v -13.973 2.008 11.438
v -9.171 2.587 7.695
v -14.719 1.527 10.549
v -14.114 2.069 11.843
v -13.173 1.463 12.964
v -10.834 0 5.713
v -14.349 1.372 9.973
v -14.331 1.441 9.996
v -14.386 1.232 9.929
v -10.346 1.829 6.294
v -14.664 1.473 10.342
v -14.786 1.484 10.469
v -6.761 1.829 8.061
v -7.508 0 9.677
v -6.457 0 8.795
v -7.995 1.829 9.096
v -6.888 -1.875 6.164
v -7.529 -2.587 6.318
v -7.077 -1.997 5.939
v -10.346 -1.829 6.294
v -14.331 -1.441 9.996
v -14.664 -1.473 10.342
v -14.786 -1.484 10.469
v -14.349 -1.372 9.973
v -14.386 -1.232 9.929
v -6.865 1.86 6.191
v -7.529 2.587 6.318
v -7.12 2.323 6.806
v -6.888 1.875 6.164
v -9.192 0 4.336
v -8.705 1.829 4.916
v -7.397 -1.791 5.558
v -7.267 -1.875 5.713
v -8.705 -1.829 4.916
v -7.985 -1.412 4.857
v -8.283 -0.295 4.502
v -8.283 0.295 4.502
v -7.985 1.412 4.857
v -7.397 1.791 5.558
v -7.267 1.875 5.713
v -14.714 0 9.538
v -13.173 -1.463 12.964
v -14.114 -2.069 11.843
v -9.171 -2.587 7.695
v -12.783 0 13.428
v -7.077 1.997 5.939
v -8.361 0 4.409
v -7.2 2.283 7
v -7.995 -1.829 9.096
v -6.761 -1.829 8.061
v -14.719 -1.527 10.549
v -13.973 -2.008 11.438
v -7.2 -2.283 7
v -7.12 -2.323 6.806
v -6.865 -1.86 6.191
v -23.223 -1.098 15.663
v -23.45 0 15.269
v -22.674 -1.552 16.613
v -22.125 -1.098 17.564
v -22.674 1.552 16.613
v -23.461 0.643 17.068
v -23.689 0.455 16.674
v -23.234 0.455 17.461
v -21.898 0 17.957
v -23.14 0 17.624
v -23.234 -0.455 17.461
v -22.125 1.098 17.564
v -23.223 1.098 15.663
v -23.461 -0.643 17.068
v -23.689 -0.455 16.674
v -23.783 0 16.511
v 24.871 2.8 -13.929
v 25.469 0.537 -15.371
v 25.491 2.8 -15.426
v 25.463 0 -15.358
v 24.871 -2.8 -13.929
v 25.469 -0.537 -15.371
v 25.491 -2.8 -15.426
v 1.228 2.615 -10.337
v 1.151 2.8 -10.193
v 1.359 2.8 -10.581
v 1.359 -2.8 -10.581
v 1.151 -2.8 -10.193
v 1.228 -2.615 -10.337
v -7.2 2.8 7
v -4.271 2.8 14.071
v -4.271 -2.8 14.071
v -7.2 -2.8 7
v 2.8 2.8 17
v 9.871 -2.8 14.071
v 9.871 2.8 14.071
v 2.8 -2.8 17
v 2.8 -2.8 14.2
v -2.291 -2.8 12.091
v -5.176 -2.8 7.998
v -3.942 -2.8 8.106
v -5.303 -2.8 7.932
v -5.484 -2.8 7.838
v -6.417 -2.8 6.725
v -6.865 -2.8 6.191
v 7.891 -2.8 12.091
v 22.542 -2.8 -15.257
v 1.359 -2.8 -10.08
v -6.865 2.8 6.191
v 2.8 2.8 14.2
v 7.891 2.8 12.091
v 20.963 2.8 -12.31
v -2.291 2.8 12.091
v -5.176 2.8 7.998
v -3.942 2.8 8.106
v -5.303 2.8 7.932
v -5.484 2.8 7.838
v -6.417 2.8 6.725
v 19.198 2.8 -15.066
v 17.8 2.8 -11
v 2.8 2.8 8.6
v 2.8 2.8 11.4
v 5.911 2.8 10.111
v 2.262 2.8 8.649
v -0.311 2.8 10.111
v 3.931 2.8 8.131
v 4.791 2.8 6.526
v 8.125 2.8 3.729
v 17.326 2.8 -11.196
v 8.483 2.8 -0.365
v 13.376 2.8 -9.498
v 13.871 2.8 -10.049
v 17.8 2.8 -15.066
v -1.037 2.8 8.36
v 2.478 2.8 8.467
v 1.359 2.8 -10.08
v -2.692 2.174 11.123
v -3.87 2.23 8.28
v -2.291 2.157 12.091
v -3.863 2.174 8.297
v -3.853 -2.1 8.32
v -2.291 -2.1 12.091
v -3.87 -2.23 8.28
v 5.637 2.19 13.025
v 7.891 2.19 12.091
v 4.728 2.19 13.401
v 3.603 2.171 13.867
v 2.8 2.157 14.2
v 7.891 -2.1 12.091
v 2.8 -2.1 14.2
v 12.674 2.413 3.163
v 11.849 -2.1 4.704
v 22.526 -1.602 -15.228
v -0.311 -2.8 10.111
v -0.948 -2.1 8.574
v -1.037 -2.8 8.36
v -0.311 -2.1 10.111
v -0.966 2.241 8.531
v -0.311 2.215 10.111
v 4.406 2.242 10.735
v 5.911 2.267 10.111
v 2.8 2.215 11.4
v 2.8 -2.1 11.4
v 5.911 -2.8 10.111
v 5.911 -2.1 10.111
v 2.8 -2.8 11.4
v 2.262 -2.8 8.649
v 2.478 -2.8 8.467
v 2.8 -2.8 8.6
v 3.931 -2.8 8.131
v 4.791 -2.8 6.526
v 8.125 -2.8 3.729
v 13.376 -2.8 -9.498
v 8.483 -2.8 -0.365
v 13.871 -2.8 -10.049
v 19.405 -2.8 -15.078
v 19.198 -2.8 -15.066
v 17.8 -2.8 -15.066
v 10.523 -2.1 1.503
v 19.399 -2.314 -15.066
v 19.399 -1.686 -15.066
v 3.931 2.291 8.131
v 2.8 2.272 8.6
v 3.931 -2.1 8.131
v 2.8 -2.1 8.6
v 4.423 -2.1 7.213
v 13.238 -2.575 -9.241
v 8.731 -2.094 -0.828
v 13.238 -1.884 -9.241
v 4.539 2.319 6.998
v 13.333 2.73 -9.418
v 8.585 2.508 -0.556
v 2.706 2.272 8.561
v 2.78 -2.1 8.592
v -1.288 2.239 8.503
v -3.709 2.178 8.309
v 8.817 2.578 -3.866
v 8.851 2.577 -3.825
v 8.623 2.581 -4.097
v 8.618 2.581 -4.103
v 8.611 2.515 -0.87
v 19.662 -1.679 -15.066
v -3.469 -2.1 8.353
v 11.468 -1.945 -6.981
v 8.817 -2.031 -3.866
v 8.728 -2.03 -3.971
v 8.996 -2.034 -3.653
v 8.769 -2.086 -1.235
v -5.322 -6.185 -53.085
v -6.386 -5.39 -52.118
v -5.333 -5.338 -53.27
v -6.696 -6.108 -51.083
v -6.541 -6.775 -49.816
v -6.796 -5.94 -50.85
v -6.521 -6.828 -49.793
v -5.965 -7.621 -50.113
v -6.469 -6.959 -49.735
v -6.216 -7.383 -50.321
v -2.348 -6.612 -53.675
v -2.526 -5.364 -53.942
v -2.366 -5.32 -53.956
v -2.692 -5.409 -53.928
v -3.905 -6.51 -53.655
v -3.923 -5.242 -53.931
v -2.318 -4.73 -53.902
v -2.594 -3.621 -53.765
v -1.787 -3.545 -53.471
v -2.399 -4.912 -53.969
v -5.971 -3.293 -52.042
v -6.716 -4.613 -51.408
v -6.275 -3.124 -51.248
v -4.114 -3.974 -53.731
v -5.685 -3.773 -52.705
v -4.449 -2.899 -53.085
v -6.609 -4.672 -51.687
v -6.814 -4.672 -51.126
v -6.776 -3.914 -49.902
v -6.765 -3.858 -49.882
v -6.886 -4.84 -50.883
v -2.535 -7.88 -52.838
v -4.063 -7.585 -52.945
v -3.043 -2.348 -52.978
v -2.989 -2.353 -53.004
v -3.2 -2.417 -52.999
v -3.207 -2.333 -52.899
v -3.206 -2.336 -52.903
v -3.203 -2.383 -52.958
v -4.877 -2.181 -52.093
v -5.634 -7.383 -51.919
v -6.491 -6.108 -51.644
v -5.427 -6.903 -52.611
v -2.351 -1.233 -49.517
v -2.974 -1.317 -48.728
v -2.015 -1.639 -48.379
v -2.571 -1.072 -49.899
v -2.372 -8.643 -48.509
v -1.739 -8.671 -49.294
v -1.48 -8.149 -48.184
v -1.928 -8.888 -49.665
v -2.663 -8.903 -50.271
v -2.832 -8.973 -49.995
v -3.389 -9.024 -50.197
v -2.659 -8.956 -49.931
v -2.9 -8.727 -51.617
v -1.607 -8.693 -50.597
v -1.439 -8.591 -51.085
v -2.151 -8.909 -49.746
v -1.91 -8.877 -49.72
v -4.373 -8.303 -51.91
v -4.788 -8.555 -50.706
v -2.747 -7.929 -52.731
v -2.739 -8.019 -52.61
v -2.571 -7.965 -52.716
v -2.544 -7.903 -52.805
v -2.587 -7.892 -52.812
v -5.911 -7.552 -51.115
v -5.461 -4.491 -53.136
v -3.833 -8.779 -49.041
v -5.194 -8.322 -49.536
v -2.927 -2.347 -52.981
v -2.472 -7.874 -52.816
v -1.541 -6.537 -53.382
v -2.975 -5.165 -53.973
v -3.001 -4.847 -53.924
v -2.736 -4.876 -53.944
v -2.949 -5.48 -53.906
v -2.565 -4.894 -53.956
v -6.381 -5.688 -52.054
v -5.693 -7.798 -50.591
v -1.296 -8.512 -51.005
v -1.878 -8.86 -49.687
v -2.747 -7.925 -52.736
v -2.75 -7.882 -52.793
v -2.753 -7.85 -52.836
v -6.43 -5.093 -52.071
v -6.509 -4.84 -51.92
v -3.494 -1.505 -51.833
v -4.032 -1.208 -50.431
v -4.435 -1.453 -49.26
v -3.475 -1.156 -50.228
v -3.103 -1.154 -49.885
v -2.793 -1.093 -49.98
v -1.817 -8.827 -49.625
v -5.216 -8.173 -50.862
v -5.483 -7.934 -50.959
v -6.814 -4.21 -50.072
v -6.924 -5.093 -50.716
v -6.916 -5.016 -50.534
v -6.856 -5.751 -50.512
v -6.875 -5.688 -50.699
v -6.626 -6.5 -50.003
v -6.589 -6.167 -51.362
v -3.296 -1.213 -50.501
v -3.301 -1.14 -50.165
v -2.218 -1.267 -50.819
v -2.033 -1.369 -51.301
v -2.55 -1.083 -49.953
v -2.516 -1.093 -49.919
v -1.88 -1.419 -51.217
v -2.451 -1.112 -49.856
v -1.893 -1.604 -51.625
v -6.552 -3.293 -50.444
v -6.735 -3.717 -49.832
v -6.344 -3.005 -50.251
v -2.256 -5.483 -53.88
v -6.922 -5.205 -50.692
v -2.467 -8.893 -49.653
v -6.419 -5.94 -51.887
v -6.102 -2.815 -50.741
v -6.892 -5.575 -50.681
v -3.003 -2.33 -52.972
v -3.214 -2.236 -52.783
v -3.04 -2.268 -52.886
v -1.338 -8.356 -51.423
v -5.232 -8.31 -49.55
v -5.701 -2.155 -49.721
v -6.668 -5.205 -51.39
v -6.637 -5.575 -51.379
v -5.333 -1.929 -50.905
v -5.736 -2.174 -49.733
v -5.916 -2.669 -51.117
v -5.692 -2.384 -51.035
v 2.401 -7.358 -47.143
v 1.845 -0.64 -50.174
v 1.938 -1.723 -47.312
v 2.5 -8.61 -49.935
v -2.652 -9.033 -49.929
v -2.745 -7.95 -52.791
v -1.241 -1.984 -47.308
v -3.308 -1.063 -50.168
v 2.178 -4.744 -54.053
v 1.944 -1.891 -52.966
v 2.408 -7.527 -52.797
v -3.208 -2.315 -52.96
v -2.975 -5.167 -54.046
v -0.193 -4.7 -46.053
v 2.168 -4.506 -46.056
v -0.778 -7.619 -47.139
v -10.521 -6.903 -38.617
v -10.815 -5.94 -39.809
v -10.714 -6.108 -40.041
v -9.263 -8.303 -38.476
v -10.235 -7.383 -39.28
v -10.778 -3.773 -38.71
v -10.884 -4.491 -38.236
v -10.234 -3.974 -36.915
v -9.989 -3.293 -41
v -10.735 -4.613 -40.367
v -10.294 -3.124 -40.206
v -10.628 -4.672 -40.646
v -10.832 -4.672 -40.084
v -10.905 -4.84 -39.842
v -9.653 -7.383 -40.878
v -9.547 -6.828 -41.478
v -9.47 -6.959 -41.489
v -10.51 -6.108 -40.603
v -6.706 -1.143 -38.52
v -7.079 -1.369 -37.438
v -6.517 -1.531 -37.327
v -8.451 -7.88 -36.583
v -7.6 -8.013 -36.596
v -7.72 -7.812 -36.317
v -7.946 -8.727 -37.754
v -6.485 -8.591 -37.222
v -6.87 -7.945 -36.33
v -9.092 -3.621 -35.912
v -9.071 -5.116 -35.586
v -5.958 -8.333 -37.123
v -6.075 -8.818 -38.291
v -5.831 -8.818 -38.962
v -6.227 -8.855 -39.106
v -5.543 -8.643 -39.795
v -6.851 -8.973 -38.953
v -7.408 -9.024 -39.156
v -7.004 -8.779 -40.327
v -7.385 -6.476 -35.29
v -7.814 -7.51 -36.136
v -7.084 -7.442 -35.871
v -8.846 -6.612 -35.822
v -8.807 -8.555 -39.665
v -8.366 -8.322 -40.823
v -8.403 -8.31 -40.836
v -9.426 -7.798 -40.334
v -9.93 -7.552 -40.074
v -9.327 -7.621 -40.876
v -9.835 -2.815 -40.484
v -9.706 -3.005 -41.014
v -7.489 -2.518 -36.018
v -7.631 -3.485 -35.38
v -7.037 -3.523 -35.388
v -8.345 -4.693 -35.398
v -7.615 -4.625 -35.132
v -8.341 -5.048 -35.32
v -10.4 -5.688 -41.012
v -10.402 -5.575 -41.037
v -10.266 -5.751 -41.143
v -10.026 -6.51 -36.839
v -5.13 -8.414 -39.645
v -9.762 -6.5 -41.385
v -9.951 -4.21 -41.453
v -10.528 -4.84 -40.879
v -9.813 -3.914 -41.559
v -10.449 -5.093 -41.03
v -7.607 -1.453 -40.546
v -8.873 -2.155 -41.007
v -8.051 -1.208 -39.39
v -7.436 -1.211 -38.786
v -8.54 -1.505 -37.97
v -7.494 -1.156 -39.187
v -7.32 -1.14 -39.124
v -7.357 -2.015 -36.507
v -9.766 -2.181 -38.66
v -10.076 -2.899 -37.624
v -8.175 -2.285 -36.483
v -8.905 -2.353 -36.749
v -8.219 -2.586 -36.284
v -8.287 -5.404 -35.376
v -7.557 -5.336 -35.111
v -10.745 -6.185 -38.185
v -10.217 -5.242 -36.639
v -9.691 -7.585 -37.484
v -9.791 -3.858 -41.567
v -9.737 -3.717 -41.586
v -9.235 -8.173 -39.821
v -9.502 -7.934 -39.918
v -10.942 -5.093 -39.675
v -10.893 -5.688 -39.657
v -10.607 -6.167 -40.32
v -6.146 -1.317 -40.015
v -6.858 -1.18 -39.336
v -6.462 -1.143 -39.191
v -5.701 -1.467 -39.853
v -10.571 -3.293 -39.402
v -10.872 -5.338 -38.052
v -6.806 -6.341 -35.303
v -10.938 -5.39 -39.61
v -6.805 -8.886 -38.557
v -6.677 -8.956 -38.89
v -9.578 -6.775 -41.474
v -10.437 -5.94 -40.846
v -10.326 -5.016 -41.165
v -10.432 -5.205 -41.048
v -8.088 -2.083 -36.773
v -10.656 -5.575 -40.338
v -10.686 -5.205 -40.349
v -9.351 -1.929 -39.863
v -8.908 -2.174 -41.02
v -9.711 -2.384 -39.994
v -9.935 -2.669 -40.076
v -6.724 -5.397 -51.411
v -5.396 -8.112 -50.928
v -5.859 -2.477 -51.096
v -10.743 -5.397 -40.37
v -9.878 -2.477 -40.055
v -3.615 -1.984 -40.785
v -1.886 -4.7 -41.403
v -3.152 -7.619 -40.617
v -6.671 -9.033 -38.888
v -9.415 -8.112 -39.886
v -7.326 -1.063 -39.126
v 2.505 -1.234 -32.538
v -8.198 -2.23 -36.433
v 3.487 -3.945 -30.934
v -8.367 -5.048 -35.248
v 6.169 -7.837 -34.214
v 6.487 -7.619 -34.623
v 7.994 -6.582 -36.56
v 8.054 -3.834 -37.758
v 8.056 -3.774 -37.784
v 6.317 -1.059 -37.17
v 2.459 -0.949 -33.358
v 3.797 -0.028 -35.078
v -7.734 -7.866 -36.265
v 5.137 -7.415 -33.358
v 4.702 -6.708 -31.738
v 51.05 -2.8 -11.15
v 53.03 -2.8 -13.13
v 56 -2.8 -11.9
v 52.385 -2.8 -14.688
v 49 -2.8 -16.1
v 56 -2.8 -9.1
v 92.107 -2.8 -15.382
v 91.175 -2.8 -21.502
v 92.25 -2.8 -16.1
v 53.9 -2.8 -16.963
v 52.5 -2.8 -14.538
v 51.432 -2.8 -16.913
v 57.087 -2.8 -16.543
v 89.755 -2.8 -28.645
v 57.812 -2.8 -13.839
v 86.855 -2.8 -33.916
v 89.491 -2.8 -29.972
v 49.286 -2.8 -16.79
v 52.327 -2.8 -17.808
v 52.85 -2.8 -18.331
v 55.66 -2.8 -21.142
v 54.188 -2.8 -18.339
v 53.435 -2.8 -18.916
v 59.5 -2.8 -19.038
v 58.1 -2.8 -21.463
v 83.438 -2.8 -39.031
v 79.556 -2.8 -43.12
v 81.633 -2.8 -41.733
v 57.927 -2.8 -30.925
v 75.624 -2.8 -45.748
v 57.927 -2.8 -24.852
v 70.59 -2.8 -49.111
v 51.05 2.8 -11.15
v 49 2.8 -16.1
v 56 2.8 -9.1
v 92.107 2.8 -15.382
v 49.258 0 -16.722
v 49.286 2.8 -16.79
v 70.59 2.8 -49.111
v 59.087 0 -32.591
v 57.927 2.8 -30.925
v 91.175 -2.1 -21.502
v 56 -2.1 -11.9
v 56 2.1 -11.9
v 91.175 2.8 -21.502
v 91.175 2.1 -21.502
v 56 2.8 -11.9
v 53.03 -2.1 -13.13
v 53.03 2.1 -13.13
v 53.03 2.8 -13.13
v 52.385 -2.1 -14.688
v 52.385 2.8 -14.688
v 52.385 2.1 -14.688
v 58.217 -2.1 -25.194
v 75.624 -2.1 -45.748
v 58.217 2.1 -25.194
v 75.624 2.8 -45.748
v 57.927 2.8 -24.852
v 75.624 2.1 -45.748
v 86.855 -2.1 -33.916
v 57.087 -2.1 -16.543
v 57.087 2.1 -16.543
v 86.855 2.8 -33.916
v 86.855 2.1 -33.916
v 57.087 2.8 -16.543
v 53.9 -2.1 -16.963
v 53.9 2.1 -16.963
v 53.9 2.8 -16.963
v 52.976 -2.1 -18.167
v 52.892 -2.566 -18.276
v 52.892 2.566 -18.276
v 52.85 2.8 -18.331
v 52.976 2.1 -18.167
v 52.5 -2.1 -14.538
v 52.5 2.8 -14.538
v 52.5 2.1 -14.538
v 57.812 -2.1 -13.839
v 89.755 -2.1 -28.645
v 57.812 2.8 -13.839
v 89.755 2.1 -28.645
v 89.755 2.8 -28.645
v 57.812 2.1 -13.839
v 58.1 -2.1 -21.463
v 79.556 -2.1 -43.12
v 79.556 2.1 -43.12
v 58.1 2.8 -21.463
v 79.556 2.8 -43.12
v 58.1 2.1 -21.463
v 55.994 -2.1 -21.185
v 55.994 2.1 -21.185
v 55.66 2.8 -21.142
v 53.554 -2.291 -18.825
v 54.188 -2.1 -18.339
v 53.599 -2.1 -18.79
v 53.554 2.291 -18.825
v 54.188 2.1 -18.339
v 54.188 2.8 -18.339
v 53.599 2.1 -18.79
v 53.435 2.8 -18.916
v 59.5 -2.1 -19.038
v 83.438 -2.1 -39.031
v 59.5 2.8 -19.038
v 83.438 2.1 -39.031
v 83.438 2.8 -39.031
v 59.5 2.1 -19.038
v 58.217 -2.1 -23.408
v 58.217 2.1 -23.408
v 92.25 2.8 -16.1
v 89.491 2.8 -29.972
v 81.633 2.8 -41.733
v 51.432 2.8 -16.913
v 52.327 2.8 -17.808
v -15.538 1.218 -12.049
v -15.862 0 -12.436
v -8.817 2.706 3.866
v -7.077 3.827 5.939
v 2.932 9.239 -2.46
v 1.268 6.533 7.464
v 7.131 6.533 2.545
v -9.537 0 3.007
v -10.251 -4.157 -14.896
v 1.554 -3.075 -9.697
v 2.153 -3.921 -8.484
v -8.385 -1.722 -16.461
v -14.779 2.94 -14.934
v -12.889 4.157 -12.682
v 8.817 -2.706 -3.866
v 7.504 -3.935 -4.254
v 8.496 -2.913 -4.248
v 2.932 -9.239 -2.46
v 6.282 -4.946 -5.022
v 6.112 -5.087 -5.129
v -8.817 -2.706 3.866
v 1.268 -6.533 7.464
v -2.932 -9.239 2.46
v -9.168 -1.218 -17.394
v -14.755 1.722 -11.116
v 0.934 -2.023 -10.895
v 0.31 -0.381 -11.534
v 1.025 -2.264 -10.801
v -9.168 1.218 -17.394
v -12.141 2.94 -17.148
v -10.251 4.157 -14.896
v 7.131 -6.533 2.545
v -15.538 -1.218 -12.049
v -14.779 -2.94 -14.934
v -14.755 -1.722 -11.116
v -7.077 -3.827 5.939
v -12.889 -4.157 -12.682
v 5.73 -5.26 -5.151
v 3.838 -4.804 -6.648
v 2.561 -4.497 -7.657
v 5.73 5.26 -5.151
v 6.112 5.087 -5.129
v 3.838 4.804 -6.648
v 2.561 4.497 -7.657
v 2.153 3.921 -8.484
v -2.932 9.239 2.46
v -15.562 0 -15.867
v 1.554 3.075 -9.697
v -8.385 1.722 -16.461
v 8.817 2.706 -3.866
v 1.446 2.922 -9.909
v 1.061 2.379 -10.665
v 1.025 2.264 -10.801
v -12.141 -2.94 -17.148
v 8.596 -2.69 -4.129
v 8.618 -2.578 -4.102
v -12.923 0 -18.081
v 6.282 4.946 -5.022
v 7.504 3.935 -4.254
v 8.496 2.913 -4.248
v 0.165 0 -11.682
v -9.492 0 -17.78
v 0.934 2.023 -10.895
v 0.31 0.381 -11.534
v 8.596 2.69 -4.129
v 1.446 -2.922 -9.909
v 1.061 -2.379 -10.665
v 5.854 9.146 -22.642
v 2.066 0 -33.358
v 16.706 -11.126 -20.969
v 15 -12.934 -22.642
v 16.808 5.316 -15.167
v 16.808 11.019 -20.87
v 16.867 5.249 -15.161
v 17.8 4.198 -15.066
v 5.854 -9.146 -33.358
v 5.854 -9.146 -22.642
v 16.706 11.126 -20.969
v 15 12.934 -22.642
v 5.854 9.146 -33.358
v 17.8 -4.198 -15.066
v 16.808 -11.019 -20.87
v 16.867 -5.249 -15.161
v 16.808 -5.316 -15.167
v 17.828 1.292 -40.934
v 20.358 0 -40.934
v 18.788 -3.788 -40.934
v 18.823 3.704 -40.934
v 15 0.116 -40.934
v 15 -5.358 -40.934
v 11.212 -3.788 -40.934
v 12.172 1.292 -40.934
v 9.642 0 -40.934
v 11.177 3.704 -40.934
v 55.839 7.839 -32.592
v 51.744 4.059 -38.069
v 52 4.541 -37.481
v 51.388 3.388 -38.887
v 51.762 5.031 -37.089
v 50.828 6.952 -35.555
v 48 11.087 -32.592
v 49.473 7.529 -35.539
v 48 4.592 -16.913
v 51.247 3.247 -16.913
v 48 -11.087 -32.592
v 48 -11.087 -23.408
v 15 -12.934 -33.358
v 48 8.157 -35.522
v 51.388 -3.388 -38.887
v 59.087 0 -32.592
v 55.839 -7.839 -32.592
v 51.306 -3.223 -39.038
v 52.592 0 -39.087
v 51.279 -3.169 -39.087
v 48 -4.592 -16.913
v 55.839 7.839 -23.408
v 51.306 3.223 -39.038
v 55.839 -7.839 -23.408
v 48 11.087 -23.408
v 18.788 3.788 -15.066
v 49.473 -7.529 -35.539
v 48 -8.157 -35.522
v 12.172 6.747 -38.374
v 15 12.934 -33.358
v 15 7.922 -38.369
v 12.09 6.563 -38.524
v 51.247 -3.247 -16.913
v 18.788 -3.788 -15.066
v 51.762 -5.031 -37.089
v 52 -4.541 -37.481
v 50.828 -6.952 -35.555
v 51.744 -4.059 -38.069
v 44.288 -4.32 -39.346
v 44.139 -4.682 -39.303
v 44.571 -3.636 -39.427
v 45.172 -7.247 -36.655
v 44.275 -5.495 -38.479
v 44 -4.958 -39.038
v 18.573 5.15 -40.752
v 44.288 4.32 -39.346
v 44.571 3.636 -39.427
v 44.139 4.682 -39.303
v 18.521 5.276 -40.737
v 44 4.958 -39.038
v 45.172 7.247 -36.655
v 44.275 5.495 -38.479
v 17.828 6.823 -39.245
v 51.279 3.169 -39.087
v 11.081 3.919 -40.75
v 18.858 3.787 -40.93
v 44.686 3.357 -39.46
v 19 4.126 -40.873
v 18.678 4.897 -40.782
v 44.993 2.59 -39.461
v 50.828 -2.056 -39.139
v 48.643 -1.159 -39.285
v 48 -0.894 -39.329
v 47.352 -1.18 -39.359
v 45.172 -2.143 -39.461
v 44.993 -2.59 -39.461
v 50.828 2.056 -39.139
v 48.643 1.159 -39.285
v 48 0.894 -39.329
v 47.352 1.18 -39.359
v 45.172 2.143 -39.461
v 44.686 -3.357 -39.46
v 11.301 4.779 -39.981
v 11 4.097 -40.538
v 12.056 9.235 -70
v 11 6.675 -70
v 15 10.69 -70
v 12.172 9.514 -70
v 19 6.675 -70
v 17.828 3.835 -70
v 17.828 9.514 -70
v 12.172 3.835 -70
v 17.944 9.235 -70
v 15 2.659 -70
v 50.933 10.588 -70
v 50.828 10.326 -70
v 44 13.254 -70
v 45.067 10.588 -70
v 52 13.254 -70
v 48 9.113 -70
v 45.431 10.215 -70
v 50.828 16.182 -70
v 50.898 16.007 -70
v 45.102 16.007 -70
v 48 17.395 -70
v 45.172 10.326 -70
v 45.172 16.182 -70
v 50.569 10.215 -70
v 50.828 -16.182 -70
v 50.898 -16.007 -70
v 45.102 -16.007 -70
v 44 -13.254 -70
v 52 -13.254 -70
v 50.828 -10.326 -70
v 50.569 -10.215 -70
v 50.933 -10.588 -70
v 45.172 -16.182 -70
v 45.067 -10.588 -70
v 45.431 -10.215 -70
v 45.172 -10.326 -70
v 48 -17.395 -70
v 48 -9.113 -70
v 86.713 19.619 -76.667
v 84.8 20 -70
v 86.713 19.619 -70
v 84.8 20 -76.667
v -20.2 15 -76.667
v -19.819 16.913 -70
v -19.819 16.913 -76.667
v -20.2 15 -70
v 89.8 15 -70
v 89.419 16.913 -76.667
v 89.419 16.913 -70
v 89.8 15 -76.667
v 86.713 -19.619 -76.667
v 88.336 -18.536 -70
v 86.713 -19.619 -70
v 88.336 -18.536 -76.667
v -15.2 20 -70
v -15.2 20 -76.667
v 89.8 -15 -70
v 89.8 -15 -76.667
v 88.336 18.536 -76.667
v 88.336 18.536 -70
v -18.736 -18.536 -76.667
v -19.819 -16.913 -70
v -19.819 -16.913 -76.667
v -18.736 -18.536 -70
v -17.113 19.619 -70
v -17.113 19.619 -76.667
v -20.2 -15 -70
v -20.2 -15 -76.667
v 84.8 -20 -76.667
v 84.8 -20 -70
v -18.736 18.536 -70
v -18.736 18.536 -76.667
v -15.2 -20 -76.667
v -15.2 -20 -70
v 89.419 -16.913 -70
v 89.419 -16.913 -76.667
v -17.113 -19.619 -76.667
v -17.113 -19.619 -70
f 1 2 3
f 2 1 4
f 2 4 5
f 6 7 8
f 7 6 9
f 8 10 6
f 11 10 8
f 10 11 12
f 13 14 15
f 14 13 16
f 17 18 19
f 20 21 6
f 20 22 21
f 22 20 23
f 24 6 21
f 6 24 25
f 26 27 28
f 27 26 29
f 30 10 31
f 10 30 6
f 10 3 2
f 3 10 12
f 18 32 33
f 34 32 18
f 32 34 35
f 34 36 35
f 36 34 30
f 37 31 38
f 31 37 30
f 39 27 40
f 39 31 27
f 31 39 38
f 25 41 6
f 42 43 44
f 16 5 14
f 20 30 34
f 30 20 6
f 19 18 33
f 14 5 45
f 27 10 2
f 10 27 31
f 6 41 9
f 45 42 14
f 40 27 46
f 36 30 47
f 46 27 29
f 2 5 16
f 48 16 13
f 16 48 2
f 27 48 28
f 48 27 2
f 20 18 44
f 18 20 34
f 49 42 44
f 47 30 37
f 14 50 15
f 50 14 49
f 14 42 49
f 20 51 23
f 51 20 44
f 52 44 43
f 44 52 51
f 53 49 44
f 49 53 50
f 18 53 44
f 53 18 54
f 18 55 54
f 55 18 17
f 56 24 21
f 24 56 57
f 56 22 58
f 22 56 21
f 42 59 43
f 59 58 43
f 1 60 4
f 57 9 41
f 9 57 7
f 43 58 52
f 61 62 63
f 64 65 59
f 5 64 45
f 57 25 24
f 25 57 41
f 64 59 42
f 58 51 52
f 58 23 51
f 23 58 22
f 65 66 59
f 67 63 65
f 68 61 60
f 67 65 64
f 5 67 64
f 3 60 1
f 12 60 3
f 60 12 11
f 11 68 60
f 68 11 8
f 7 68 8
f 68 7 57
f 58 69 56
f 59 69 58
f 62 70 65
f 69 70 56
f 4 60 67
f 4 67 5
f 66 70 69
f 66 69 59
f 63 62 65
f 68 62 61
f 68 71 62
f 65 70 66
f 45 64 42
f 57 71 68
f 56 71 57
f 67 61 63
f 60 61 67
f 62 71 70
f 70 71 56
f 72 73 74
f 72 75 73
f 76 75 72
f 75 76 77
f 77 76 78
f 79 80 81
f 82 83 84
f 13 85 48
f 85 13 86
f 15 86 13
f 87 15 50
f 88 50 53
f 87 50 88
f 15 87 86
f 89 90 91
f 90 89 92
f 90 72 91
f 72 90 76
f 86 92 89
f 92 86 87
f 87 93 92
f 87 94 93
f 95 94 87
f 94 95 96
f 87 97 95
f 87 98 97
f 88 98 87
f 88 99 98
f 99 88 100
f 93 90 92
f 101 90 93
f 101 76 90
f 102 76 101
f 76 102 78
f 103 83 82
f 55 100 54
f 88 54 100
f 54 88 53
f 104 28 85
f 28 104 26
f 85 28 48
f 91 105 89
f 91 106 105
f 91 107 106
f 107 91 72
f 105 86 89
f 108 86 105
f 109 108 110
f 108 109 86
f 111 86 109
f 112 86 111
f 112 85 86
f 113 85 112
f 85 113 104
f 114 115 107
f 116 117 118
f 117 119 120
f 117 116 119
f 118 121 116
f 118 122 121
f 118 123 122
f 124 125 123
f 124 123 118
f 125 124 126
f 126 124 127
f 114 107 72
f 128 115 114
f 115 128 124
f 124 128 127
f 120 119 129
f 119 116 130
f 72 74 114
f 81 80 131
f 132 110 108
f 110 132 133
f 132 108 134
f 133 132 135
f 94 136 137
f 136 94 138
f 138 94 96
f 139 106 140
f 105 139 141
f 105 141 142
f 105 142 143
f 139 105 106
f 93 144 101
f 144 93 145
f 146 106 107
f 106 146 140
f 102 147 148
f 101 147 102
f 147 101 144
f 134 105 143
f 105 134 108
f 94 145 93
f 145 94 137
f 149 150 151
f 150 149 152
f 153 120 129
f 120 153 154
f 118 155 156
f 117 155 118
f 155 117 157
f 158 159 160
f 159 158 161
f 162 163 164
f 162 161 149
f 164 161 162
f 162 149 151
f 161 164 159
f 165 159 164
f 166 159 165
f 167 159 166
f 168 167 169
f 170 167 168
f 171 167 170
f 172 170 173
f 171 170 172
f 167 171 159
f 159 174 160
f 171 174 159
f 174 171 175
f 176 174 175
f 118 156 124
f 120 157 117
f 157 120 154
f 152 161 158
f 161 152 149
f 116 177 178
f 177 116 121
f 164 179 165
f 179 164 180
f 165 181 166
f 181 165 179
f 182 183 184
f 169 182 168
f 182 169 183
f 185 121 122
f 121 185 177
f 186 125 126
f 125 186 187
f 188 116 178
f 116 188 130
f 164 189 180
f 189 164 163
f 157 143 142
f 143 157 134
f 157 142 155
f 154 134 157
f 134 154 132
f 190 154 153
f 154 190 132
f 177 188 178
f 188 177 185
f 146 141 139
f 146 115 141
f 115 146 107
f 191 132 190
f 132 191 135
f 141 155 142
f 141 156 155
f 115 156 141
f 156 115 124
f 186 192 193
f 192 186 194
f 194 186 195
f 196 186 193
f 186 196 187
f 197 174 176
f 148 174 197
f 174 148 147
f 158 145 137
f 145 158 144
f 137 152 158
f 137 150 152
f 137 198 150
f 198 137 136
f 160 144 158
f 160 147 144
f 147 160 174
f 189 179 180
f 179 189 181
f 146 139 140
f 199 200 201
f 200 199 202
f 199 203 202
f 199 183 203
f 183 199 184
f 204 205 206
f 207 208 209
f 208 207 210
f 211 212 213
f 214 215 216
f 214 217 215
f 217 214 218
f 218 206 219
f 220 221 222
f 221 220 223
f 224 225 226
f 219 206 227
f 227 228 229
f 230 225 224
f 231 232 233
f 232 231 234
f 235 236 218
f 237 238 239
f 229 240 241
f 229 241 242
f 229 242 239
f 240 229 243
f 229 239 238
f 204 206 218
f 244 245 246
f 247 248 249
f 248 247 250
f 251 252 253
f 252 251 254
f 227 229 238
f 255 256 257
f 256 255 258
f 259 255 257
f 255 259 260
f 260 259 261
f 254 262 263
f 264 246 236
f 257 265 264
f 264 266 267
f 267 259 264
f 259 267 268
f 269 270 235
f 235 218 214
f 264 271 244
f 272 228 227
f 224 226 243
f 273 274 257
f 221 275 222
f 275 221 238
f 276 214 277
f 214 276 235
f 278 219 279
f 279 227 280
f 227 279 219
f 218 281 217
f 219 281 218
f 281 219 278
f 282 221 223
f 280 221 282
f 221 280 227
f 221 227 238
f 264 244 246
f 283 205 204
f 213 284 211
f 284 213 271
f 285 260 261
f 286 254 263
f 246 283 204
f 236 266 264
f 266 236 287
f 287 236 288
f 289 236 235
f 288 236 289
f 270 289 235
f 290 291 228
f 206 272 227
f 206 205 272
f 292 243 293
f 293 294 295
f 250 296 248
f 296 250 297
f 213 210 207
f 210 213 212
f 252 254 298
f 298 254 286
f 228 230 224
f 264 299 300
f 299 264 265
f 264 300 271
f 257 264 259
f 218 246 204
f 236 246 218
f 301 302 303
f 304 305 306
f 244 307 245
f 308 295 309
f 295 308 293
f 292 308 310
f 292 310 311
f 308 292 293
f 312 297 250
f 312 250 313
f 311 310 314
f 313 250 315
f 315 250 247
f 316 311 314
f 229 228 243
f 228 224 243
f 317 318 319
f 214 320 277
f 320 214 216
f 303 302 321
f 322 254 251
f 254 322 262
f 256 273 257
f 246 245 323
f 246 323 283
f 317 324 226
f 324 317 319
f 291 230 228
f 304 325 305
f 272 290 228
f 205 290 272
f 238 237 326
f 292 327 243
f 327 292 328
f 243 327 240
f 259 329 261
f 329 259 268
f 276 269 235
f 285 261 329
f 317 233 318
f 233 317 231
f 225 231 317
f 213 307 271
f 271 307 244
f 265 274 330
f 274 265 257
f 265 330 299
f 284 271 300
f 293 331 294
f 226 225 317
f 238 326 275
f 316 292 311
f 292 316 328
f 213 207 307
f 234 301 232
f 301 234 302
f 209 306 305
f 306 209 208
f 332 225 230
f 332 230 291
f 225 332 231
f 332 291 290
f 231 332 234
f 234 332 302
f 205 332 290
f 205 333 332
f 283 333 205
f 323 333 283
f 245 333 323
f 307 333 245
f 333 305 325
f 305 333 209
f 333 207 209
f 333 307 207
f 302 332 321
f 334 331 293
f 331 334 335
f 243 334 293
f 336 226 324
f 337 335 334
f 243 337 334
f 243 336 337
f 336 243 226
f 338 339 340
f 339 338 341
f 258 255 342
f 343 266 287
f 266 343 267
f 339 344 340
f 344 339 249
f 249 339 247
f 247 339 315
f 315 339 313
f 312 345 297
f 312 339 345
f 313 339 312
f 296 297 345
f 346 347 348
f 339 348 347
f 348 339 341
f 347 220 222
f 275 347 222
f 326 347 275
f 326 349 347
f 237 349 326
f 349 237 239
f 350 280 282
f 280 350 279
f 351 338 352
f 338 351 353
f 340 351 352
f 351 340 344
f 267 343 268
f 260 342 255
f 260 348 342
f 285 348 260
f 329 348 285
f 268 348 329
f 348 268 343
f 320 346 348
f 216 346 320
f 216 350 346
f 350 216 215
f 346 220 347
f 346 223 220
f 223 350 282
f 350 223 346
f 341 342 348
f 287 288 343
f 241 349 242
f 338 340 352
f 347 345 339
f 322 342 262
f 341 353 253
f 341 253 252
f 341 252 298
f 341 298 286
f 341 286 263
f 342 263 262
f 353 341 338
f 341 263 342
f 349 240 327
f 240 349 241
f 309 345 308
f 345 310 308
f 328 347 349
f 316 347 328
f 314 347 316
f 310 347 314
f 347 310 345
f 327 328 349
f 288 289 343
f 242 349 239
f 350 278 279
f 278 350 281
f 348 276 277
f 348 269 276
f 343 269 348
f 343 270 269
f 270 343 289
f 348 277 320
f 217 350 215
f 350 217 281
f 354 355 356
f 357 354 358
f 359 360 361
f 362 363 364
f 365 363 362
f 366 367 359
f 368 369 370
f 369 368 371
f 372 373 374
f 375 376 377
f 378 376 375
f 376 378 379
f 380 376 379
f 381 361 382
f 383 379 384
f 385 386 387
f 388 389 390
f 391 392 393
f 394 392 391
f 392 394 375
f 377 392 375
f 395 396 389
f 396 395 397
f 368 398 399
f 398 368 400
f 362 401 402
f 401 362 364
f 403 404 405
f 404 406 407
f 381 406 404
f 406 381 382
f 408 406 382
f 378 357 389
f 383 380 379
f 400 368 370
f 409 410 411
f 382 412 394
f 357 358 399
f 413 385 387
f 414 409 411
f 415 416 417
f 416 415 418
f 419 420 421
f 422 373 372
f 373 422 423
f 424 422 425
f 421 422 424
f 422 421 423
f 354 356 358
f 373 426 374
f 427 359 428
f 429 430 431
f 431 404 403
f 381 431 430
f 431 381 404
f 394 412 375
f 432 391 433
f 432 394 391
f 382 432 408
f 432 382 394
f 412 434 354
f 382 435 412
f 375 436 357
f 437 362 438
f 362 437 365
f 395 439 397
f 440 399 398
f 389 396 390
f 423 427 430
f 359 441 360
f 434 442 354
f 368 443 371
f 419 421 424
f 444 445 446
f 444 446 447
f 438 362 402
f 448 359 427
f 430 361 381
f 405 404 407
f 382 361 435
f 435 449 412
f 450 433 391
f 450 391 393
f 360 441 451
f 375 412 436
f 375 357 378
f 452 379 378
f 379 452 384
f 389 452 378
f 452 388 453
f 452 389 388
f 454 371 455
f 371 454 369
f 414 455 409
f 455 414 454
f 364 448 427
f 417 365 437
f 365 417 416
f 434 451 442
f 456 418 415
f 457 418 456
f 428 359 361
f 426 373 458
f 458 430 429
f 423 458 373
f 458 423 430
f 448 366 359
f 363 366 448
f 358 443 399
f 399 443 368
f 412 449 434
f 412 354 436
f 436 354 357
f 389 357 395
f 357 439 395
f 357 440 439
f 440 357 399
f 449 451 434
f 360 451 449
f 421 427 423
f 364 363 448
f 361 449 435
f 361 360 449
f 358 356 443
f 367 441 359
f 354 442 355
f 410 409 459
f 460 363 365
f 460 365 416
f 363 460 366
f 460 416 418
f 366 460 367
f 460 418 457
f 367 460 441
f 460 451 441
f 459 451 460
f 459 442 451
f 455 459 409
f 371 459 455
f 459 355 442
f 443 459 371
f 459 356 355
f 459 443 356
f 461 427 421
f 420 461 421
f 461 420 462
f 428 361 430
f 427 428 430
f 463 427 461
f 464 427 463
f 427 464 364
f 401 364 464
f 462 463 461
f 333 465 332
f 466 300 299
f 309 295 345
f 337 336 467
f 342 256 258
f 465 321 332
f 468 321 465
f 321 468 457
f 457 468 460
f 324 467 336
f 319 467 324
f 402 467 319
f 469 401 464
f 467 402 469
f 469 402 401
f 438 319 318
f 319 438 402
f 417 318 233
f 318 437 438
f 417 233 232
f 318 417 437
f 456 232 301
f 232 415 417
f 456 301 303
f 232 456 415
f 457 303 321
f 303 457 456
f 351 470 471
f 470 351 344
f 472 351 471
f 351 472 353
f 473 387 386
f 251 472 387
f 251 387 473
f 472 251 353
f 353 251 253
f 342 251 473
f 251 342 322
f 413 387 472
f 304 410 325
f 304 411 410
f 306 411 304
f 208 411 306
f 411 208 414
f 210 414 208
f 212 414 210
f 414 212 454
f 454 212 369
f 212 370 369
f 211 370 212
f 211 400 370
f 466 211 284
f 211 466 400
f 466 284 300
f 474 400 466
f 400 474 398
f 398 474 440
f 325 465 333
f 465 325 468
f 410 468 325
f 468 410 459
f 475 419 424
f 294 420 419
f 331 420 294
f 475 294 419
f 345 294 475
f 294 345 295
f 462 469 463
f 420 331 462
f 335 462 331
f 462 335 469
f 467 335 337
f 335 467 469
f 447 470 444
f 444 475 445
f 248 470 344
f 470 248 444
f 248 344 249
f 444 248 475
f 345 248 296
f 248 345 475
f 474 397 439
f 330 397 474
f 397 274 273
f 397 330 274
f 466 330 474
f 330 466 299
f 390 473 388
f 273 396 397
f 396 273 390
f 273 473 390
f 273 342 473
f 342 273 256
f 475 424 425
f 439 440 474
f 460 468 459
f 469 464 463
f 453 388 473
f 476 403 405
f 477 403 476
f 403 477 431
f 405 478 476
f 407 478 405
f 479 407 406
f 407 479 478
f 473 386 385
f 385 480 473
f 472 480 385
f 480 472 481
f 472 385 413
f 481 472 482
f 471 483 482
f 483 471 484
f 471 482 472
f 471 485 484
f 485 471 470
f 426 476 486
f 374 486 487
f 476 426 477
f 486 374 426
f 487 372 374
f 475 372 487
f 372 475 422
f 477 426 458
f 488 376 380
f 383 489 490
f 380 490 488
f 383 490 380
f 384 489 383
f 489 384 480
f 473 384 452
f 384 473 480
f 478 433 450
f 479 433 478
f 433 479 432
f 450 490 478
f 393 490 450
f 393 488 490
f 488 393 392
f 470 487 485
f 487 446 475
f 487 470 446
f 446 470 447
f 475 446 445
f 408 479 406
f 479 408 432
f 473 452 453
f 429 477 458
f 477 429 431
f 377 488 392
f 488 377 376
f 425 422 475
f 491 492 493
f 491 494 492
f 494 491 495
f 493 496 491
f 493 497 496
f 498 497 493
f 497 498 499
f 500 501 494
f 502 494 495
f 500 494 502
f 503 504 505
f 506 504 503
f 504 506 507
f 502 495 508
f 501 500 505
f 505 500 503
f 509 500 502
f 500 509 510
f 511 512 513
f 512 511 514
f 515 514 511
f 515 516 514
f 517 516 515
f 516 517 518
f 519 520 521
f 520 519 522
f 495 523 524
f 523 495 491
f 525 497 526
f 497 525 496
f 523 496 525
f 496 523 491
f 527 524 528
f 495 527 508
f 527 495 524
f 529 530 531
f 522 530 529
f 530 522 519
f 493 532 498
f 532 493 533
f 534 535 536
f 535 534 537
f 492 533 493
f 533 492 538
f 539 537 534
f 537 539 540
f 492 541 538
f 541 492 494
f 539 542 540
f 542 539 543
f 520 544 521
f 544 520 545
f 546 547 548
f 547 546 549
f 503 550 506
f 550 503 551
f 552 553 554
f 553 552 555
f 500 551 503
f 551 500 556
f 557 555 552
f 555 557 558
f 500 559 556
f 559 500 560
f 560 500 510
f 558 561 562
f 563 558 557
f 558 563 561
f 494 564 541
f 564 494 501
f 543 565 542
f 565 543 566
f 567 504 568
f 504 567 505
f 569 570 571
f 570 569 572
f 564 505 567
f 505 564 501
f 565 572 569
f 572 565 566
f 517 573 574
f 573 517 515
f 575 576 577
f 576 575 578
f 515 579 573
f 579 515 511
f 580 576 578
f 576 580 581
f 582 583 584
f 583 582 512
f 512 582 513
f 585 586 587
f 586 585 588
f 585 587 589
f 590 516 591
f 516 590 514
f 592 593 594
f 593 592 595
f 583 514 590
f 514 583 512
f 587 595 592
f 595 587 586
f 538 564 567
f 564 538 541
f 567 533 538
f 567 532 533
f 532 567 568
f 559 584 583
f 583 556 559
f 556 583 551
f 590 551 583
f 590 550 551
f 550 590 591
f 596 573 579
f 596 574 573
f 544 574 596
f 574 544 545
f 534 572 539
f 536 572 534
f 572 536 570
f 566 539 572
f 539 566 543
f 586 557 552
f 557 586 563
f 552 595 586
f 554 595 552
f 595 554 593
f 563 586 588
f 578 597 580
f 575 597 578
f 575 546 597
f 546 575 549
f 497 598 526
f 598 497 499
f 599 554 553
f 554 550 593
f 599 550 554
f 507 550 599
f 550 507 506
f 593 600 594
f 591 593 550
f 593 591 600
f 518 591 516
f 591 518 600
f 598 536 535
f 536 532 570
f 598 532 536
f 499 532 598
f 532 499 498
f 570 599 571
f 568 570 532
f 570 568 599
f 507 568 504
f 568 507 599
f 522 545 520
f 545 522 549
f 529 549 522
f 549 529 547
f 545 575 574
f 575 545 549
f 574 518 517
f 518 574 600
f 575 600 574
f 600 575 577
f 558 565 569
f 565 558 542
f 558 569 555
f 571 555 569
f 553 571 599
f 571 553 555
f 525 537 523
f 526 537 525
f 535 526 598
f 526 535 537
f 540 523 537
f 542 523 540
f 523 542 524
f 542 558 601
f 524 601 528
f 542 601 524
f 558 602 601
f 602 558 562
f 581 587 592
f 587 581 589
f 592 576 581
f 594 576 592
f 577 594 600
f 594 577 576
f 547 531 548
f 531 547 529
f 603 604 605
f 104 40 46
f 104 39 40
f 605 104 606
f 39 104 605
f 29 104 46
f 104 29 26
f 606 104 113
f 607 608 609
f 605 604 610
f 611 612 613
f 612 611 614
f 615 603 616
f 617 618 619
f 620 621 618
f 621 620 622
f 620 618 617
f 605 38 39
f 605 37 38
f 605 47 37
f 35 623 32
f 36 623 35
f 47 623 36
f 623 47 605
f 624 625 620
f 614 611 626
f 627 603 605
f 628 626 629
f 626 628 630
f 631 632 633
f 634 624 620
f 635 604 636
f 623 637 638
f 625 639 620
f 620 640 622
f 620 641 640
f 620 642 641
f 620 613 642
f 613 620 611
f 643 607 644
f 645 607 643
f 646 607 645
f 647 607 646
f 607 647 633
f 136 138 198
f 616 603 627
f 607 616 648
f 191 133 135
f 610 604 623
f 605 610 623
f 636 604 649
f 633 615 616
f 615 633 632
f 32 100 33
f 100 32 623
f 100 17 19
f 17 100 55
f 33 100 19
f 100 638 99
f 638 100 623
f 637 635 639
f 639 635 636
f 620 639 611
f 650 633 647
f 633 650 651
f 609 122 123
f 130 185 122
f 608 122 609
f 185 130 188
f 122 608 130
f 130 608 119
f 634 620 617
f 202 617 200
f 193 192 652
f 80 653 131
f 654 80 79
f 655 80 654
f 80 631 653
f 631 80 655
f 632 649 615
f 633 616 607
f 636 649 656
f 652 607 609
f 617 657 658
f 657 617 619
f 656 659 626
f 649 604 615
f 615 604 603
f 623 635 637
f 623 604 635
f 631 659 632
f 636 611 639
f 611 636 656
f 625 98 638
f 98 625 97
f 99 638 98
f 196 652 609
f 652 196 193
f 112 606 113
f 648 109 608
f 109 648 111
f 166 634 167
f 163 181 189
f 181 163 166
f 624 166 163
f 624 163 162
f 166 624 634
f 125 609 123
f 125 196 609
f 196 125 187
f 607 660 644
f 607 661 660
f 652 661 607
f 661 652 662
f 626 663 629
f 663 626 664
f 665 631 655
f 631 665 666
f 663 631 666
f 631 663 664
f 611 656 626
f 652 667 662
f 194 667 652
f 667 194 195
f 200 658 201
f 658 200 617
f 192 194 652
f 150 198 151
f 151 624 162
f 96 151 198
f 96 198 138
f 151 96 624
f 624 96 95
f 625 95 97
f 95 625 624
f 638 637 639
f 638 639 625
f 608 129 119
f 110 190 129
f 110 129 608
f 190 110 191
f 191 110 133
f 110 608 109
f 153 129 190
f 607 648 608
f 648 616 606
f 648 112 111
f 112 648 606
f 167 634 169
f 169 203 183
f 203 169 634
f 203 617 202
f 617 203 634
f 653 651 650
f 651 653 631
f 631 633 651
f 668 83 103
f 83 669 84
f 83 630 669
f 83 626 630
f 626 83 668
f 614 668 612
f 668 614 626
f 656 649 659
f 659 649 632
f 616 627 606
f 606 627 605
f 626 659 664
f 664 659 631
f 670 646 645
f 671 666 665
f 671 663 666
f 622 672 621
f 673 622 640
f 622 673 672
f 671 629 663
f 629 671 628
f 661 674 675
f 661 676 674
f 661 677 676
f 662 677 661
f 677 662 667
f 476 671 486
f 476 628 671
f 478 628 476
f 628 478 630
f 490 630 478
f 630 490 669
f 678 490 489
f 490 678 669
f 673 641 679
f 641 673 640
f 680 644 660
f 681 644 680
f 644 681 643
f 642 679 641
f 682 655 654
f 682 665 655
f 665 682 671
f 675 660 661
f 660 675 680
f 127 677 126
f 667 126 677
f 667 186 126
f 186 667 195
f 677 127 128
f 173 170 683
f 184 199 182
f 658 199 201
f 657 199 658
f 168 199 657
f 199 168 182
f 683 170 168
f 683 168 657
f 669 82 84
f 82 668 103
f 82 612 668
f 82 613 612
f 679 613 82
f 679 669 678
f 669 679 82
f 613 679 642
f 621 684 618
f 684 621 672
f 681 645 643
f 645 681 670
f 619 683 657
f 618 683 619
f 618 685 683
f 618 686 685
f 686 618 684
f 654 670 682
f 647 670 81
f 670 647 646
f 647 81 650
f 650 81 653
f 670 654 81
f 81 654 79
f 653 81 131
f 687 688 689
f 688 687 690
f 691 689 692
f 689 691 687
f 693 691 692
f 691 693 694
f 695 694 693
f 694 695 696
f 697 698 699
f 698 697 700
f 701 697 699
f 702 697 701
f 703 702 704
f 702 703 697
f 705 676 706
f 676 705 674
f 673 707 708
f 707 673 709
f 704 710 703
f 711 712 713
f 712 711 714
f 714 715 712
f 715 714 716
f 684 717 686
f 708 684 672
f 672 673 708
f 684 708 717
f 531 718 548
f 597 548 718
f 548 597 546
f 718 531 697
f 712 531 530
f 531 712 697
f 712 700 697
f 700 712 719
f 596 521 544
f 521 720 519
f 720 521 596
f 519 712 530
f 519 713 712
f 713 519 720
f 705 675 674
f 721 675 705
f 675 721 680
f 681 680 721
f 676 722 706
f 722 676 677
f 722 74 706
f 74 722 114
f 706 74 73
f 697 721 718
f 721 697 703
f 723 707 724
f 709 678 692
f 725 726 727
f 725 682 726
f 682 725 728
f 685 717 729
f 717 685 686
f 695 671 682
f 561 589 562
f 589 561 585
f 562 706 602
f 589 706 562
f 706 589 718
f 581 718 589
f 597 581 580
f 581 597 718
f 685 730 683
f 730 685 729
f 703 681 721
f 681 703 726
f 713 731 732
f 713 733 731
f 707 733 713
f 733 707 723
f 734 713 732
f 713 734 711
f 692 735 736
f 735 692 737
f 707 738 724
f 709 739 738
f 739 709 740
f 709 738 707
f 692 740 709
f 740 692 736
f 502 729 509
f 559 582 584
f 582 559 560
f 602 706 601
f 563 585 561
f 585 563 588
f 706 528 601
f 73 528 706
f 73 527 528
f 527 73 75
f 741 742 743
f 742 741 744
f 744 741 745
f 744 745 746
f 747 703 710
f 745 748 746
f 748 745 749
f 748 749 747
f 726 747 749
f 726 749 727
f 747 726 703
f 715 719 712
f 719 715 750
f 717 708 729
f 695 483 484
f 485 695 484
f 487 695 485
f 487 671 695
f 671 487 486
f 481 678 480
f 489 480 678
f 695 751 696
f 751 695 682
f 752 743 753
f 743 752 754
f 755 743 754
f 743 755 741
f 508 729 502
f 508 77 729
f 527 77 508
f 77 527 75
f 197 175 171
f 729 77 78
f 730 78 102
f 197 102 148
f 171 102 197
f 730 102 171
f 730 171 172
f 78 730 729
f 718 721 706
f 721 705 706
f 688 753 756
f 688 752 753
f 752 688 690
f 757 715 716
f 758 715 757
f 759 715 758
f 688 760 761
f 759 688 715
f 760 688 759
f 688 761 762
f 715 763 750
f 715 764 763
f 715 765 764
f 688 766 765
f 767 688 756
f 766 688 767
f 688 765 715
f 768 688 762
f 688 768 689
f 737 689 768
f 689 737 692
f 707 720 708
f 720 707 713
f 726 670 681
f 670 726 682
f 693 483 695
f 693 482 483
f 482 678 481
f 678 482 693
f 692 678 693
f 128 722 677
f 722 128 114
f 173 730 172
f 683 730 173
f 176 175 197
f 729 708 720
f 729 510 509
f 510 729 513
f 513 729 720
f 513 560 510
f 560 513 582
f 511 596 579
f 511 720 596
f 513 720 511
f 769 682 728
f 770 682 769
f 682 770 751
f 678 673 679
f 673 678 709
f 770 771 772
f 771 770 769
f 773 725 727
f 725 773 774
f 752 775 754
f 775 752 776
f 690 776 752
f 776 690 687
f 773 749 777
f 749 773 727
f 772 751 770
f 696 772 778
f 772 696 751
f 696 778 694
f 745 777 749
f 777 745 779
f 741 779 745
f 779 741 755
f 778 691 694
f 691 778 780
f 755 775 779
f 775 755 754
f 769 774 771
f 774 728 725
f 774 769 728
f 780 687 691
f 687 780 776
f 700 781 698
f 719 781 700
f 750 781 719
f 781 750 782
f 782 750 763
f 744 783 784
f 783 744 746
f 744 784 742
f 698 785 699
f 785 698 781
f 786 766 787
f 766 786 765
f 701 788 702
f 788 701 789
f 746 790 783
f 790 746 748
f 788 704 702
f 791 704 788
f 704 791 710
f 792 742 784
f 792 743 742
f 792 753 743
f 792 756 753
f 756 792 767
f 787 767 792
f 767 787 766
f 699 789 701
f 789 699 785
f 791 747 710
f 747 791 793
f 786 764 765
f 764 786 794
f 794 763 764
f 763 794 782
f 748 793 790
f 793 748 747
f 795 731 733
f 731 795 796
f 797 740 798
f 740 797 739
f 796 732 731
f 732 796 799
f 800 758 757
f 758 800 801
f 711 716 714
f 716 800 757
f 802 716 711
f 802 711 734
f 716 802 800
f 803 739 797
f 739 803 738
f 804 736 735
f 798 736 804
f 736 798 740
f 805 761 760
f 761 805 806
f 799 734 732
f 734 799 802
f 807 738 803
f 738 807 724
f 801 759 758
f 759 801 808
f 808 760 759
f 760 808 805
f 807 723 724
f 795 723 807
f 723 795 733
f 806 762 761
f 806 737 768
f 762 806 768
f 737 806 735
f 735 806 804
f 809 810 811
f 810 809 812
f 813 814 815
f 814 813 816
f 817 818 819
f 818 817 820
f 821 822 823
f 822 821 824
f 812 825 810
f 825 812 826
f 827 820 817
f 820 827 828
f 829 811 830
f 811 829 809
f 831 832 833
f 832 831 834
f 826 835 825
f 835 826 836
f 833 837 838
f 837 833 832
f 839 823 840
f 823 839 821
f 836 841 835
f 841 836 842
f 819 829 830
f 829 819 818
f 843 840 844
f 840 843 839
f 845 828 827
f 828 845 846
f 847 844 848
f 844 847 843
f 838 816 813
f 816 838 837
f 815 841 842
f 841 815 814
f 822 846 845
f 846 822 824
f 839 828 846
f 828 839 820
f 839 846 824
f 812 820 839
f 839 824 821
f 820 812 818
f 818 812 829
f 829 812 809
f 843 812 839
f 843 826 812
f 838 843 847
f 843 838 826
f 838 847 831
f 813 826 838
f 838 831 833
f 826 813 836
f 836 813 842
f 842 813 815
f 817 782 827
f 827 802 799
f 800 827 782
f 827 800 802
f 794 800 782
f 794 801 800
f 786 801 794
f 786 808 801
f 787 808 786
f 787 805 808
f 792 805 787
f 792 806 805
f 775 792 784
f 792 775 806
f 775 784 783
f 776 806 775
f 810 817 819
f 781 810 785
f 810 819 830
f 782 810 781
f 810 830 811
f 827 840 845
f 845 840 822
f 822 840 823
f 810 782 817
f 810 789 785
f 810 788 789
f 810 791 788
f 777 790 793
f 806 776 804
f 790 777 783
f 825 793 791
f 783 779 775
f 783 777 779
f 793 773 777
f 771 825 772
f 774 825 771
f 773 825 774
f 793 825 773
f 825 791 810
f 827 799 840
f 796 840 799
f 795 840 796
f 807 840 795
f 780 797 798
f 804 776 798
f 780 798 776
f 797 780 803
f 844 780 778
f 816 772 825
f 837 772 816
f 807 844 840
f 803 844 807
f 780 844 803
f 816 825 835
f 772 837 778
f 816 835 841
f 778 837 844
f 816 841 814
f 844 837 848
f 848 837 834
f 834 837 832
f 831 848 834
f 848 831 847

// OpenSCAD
// Cadcorn, a parametric model of a 3D-printable unicorn
// ©2015 Paul Houghton, paul.houghton@futurice.com, CC-attribution-sharealike license, http://creativecommons.org/licenses/by-sa/4.0/
low_poly = 8;
high_poly = 64;
low_poly_joint = 16;
high_poly_joint = 64;

$fn=low_poly;
joint_poly = low_poly_joint;
scale = 1;

head_big_radius = 10*scale;
head_small_radius = 4.5*scale;
head_length = 18*scale;
head_angle = 50;

horn_length = 20*scale;
horn_radius = 2.8*scale;

mane_thickness = 2*horn_radius;
mane_radius = head_big_radius;
mane_height = head_big_radius * 0.7;
mane_x = head_big_radius * 0.28;
mane_length_x = 10*scale;
mane_length_z = 20*scale;

hair_thickness = mane_thickness / 8;
hair_spacing = mane_thickness / 2;

neck_radius = 3*scale;
neck_ratio = .2; // Flattens the interface to the top body
neck_top_x = 3*scale;

body_x = 15*scale;
body_z = 28*scale;
body_radius = 14*scale;
body_back_radius = 12*scale;
body_length = 33*scale;

leg_length = (33*scale + body_radius);
leg_radius = 4*scale;

cute_leg_first_ratio = 0.5;
cute_leg_second_ratio = 0.25;
cute_leg_third_ratio = 0.11;

tail_thickness = mane_thickness;
tail_radius = 10 * hair_thickness;
tail_x = 2*body_x + body_length - tail_radius;
tail_height = -body_z + 1.7*tail_radius;
tail_tip_length = 29*scale;

base_thickness = 10*scale;
base_width = 40*scale;
base_corner_radius = 5*scale;
base_length = 100*scale;

module head() {
    rotate([0, -head_angle, 0]) {
        hull () {
            sphere(r=head_big_radius);
            translate([-head_length, 0, 0])
                sphere(r=head_small_radius);    
        }
    }
}

module horn() {
    rotate([0, -head_angle, 0]) {
        translate([0, 0, head_big_radius - .2*scale])
        cylinder(h = horn_length, r1 = horn_radius, r2 = 0);
    }
}

module chili_horn() {
    rotate([0, -head_angle, 0]) {
        z = 1.1*scale + head_big_radius - .2*scale;
        translate([0, 0, z])
            hull() {
                sphere(r = horn_radius);
                translate([0, 0, horn_length/3])
                    sphere(r = horn_radius * .8);
            }
       translate([0, 0, z + horn_length/3])
            hull() {
                sphere(r = horn_radius * .8);
                rotate([0, -10, 0]) {
                    translate([0, 0, 3*horn_length/6])
                        sphere(r = horn_radius * .6);
                }
            }
    }
}

module neck() {
    hull() {
        translate([neck_top_x, 0, 0]) rotate([0, 180, 0]) {
            cylinder(h = head_big_radius - .2*scale, r1 = neck_radius, r2 = neck_radius);
        }
        translate([body_x, 0, -body_z])
            difference() {
                sphere(r = body_radius);
                translate([body_radius*neck_ratio, -body_radius, -body_radius])
                    cube([body_radius, 2*body_radius, 2*body_radius]);
            }
        }
}

module hair_line(x = 0, z = 0, hair_radius = mane_radius, delta_x = body_x, delta_z = body_z) {
    translate([x, 0, z])
            difference() {
                hull() {
                    cylinder(h = mane_thickness, r = hair_radius);
                    translate([delta_x, -delta_z, 0])
                        cylinder(h = mane_thickness, r = hair_radius);
                }
                hull() {
                    cylinder(h = mane_thickness, r = hair_radius - hair_spacing);
                    translate([delta_x, -delta_z, 0])
                        cylinder(h = mane_thickness, r = hair_radius - hair_spacing);
                }                
            }
}

module mane() {
    translate([mane_x, mane_thickness/2, mane_height])
        rotate([90, 0, 0]) {
                hull() {
                    translate([0, 0, hair_thickness])
                    cylinder(h = mane_thickness - 2*hair_thickness, r = mane_radius);
                    translate([body_x, -body_z, 0])
                       cylinder(h = mane_thickness - 2*hair_thickness, r = mane_radius);
                }
              hair_line();
              hair_line(hair_radius = mane_radius - 2*hair_spacing);
        }
}

module body() {
    translate([body_x, 0, -body_z])
        hull() {
            sphere(r = body_radius);
            translate([body_length, 0, 0]) 
                sphere(r = body_back_radius);
        }
}

module leg(lengthwards=0, sideways=0, theta=20) {
    translate([body_x + lengthwards, sideways, -body_z])
        rotate([180 + theta, 0, 0]) {
        cylinder(h = leg_length, r1 = leg_radius, r2 = leg_radius);
        }
}

module cute_leg(lengthwards=0, sideways=0, downwards=0, theta=20, rise_angle=70) {
    translate([body_x + lengthwards, sideways, -body_z - downwards])
        rotate([180 + theta, rise_angle, 0]) {
            cylinder(h = leg_length*cute_leg_first_ratio, r1 = leg_radius, r2 = leg_radius);
            translate([0, 0, leg_length*cute_leg_first_ratio])
                union() {
                    sphere($fn = joint_poly, r = leg_radius);
                    rotate([0, 90, 0]) {
                        cylinder(h = leg_length*cute_leg_second_ratio, r1 = leg_radius, r2 = leg_radius);
                    }
                    translate([leg_length*cute_leg_second_ratio, 0, 0])
                        union() {
                            sphere($fn = joint_poly, r = leg_radius);
                            rotate([0, 90 + rise_angle, 0]) {
                                cylinder(h = leg_length*cute_leg_third_ratio, r1 = leg_radius, r2 = leg_radius);
                            }
                        }
                }
    }
}

module tail_outer_hair() {
    translate([0, 0, -hair_thickness])
        difference() {
            hull() {
                cylinder(h = tail_thickness, r = tail_radius);
                translate([body_x, -1.2*body_z, 0])
                    rotate([0, 0, 11]) {
                        cube([tail_tip_length, tail_tip_length, tail_thickness]);
                    }
            }
            hull() {
                cylinder(h = tail_thickness, r = tail_radius - hair_spacing);
                translate([body_x + 2*hair_spacing, -1.2*body_z + hair_spacing, 0]) rotate([0, 0, 11]) {
                    cube([tail_tip_length - 2.8*hair_spacing, tail_tip_length - 2.8*hair_spacing, tail_thickness]);
                }
            }
        }
}

module tail_single_hair(n=1) {
    translate([0, -4.5*n, -hair_thickness])
        rotate([0, 0, -15*n]) {
            difference() {
                hull() {
                    cylinder(h = tail_thickness, r = tail_radius);
                    translate([body_x, -1.2*body_z, 0])
                        rotate([0, 0, 11]) {
                            cube([tail_tip_length, tail_tip_length, tail_thickness]);
                        }
                }
                union() {
                    hull() {
                        cylinder(h = tail_thickness, r = tail_radius - hair_spacing);
                        translate([body_x + 2*hair_spacing, -1.2*body_z + hair_spacing, 0]) rotate([0, 0, 11]) {
                            cube([tail_tip_length - 2.8*hair_spacing, tail_tip_length - 2.8*hair_spacing, tail_thickness]);
                        }
                    }
                    rotate([50, 90, 0]) {
                        translate([-3*scale, -7*scale, 0]) cylinder(r = 6*scale, h = 40*scale);
                    }
                }
            }
        }
}

module tail() {
    translate([tail_x, tail_thickness/2 - hair_thickness, tail_height])
        rotate([90, 0, 0]) {
            intersection() {
                union() {
                    hull() {
                        cylinder(h = tail_thickness - 2*hair_thickness, r = tail_radius);
                        translate([body_x, -1.2*body_z, 0])
                            rotate([0, 0, 11]) {
                               cube([tail_tip_length, tail_tip_length, tail_thickness - 2*hair_thickness]);
                            }
                    }
                    tail_outer_hair();
                    tail_single_hair(n=1);
                    tail_single_hair(n=2);
                }
                translate([0, 0, -hair_thickness])
                    cylinder($fn = 16, h = 10*scale+tail_thickness, r = tail_tip_length*1.25);
            }
        }
}

module base() {
    translate([body_x + 0.6*body_length, 0, -leg_length - body_z])
        minkowski() {
            cylinder($fn = joint_poly, h = base_thickness / 3, r = base_corner_radius);
            cube([base_length, base_width - 2*base_corner_radius, base_thickness/3], center = true);
        }
}

union() { // difference() -> no base, or union() -> solid base
    union() {
        head();
//        horn();  // Uncomment either horn() or chili_horn or neither
        color("red") chili_horn();
        neck();
        mane();
        body();
        leg(theta=5, sideways=3*scale);
        cute_leg(theta=-5, sideways=-3*scale, downwards=3*scale);
        leg(lengthwards = body_length, sideways=2*scale, theta=15);
        leg(lengthwards = body_length, sideways=-2*scale, theta=-15);
        tail();
    }
    base();
}
